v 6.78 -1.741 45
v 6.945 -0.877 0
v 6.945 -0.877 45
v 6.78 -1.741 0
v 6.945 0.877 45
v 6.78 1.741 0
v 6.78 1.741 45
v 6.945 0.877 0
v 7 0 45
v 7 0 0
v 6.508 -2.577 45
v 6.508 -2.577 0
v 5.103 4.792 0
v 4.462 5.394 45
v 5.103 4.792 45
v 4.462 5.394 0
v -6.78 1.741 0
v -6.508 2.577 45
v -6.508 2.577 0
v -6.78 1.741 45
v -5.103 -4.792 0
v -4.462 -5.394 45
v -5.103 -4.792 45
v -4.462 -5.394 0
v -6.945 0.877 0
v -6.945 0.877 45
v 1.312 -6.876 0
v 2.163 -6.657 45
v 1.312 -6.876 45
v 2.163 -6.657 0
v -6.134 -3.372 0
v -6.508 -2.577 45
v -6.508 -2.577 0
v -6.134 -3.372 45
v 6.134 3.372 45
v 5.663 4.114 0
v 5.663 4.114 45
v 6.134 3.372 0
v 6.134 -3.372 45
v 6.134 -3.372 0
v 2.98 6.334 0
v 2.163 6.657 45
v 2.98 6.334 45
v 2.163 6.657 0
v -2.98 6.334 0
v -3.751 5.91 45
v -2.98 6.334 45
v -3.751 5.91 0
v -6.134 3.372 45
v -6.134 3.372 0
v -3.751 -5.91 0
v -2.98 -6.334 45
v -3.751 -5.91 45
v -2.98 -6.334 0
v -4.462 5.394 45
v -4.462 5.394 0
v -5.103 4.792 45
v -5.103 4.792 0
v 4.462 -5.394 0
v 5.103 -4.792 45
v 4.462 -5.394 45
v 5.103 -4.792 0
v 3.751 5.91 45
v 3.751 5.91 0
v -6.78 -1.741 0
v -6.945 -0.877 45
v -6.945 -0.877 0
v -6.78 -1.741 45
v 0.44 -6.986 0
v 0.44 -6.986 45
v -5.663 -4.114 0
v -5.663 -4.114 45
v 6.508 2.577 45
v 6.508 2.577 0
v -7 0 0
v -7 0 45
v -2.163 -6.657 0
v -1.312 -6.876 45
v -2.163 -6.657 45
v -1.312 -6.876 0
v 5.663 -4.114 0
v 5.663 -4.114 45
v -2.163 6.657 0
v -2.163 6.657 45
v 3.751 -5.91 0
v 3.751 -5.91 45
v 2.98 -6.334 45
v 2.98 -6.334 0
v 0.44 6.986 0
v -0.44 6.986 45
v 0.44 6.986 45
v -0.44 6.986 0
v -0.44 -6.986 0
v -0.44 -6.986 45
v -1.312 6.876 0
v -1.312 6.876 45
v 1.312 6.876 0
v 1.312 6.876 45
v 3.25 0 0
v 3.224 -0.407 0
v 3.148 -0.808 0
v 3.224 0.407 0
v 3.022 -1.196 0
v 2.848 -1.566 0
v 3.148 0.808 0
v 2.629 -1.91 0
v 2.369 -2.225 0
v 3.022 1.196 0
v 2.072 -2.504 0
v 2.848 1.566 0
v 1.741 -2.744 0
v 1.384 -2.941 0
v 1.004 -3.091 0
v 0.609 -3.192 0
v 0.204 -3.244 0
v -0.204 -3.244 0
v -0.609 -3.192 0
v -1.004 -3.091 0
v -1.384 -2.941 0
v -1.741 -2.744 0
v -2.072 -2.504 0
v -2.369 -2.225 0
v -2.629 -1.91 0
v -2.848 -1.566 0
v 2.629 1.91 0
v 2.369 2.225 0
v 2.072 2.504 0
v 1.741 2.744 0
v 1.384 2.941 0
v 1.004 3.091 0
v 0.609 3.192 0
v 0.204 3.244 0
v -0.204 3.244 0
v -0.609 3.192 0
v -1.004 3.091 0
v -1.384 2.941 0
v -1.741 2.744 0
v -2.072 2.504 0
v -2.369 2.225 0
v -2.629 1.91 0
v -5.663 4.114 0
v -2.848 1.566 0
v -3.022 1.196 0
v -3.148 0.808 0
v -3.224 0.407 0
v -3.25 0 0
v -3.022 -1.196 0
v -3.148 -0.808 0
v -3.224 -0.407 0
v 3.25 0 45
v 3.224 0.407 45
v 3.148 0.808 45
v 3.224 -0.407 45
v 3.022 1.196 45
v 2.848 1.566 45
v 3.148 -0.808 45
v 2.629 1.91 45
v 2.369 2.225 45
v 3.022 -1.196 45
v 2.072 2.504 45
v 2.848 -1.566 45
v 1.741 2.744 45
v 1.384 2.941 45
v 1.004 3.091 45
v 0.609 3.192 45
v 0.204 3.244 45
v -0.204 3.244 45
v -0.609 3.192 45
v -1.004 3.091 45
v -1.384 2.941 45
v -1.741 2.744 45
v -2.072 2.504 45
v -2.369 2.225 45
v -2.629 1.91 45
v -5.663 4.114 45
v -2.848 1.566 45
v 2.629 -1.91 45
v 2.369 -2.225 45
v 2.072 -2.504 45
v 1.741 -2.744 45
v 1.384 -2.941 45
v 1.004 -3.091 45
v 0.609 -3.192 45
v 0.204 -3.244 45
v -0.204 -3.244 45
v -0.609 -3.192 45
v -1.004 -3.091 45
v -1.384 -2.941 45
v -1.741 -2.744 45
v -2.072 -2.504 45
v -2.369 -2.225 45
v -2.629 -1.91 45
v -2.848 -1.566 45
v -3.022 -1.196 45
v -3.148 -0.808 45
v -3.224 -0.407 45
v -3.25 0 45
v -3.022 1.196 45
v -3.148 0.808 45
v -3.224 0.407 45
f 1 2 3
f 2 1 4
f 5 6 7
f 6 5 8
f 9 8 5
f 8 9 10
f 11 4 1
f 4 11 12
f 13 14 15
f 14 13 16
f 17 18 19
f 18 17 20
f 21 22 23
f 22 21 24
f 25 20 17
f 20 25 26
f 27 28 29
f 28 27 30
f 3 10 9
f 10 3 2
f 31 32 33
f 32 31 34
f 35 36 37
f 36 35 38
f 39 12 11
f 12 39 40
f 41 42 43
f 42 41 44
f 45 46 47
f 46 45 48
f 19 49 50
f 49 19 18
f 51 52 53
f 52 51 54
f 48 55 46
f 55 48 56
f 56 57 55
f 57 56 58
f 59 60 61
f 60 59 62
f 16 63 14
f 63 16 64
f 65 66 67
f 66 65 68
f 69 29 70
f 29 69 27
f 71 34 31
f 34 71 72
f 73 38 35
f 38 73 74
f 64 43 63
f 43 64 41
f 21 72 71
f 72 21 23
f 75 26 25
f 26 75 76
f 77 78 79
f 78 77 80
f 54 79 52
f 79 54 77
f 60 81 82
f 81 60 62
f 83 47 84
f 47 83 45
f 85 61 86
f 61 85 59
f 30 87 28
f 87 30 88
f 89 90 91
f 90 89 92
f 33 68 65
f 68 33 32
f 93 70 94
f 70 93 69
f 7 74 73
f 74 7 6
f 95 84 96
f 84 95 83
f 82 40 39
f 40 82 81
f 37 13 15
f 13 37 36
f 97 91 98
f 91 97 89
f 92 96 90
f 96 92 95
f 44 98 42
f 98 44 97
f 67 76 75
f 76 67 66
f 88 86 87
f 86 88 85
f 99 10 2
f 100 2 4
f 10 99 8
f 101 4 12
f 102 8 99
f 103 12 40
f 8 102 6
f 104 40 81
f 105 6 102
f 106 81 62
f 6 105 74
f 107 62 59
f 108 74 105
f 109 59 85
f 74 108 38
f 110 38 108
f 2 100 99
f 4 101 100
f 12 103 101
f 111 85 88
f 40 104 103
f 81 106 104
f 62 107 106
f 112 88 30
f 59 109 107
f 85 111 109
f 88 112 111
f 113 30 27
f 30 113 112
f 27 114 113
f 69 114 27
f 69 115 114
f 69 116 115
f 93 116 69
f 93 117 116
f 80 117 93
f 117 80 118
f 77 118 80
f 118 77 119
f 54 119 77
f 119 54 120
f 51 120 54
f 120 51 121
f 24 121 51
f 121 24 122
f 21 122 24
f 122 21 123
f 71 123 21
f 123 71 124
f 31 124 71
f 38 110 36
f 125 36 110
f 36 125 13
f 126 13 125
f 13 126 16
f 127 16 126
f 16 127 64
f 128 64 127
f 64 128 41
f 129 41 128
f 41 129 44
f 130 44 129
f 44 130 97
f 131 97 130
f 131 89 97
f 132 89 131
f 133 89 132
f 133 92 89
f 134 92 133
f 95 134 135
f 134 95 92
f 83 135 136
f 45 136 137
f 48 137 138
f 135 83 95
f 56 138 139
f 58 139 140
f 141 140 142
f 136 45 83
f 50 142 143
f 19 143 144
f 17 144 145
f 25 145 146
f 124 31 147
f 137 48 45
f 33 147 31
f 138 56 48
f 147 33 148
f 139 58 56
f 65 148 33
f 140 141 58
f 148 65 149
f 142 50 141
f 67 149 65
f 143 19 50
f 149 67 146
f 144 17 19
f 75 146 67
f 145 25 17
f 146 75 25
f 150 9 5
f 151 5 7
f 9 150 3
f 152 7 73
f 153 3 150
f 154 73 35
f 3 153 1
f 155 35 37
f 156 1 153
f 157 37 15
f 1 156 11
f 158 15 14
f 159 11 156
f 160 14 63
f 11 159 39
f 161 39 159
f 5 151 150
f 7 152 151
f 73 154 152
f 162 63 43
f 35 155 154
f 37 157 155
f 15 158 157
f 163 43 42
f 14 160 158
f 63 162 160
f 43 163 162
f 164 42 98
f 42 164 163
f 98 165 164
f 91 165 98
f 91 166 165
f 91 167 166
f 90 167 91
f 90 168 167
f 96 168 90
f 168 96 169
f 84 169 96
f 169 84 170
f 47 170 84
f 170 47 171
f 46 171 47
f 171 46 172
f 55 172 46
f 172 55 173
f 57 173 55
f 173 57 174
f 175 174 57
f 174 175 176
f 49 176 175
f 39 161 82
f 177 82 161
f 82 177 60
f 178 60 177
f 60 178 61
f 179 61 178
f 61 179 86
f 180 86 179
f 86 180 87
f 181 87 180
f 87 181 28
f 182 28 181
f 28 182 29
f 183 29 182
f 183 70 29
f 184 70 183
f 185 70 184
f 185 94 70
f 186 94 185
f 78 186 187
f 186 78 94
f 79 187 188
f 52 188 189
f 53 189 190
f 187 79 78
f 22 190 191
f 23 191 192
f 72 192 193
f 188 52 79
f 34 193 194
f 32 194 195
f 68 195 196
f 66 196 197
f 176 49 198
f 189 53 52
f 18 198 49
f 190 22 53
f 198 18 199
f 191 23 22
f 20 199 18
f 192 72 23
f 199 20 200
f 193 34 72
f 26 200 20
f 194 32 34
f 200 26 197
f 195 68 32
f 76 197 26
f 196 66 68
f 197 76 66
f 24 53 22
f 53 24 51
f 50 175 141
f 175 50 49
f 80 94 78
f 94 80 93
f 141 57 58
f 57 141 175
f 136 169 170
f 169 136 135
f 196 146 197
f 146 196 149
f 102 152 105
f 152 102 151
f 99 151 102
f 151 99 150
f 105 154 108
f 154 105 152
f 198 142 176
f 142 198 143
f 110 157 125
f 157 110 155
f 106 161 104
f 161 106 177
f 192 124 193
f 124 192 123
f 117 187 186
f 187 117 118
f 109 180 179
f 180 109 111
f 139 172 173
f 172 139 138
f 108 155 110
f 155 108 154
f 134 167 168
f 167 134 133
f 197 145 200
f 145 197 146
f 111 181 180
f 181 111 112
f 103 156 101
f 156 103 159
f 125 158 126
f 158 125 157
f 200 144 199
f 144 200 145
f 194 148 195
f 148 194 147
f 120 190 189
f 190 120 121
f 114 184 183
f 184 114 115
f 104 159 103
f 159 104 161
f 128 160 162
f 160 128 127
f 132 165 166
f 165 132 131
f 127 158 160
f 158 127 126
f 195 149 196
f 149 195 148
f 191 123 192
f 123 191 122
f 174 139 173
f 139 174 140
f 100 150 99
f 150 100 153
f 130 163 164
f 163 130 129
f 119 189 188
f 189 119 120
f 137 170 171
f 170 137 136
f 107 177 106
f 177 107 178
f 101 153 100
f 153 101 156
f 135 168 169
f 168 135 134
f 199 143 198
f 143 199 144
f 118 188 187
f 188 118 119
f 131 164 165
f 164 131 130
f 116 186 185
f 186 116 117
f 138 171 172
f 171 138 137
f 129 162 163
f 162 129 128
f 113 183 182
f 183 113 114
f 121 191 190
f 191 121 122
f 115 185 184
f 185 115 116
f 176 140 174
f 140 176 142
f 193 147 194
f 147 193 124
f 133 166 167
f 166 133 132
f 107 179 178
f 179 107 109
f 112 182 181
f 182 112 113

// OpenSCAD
$fn = 50;


difference() {
	union() {
		cylinder(h = 45, r = 7.0000000000);
	}
	union() {
		translate(v = [0, 0, -100]) {
			cylinder(h = 200, r = 3.2500000000);
		}
	}
}
